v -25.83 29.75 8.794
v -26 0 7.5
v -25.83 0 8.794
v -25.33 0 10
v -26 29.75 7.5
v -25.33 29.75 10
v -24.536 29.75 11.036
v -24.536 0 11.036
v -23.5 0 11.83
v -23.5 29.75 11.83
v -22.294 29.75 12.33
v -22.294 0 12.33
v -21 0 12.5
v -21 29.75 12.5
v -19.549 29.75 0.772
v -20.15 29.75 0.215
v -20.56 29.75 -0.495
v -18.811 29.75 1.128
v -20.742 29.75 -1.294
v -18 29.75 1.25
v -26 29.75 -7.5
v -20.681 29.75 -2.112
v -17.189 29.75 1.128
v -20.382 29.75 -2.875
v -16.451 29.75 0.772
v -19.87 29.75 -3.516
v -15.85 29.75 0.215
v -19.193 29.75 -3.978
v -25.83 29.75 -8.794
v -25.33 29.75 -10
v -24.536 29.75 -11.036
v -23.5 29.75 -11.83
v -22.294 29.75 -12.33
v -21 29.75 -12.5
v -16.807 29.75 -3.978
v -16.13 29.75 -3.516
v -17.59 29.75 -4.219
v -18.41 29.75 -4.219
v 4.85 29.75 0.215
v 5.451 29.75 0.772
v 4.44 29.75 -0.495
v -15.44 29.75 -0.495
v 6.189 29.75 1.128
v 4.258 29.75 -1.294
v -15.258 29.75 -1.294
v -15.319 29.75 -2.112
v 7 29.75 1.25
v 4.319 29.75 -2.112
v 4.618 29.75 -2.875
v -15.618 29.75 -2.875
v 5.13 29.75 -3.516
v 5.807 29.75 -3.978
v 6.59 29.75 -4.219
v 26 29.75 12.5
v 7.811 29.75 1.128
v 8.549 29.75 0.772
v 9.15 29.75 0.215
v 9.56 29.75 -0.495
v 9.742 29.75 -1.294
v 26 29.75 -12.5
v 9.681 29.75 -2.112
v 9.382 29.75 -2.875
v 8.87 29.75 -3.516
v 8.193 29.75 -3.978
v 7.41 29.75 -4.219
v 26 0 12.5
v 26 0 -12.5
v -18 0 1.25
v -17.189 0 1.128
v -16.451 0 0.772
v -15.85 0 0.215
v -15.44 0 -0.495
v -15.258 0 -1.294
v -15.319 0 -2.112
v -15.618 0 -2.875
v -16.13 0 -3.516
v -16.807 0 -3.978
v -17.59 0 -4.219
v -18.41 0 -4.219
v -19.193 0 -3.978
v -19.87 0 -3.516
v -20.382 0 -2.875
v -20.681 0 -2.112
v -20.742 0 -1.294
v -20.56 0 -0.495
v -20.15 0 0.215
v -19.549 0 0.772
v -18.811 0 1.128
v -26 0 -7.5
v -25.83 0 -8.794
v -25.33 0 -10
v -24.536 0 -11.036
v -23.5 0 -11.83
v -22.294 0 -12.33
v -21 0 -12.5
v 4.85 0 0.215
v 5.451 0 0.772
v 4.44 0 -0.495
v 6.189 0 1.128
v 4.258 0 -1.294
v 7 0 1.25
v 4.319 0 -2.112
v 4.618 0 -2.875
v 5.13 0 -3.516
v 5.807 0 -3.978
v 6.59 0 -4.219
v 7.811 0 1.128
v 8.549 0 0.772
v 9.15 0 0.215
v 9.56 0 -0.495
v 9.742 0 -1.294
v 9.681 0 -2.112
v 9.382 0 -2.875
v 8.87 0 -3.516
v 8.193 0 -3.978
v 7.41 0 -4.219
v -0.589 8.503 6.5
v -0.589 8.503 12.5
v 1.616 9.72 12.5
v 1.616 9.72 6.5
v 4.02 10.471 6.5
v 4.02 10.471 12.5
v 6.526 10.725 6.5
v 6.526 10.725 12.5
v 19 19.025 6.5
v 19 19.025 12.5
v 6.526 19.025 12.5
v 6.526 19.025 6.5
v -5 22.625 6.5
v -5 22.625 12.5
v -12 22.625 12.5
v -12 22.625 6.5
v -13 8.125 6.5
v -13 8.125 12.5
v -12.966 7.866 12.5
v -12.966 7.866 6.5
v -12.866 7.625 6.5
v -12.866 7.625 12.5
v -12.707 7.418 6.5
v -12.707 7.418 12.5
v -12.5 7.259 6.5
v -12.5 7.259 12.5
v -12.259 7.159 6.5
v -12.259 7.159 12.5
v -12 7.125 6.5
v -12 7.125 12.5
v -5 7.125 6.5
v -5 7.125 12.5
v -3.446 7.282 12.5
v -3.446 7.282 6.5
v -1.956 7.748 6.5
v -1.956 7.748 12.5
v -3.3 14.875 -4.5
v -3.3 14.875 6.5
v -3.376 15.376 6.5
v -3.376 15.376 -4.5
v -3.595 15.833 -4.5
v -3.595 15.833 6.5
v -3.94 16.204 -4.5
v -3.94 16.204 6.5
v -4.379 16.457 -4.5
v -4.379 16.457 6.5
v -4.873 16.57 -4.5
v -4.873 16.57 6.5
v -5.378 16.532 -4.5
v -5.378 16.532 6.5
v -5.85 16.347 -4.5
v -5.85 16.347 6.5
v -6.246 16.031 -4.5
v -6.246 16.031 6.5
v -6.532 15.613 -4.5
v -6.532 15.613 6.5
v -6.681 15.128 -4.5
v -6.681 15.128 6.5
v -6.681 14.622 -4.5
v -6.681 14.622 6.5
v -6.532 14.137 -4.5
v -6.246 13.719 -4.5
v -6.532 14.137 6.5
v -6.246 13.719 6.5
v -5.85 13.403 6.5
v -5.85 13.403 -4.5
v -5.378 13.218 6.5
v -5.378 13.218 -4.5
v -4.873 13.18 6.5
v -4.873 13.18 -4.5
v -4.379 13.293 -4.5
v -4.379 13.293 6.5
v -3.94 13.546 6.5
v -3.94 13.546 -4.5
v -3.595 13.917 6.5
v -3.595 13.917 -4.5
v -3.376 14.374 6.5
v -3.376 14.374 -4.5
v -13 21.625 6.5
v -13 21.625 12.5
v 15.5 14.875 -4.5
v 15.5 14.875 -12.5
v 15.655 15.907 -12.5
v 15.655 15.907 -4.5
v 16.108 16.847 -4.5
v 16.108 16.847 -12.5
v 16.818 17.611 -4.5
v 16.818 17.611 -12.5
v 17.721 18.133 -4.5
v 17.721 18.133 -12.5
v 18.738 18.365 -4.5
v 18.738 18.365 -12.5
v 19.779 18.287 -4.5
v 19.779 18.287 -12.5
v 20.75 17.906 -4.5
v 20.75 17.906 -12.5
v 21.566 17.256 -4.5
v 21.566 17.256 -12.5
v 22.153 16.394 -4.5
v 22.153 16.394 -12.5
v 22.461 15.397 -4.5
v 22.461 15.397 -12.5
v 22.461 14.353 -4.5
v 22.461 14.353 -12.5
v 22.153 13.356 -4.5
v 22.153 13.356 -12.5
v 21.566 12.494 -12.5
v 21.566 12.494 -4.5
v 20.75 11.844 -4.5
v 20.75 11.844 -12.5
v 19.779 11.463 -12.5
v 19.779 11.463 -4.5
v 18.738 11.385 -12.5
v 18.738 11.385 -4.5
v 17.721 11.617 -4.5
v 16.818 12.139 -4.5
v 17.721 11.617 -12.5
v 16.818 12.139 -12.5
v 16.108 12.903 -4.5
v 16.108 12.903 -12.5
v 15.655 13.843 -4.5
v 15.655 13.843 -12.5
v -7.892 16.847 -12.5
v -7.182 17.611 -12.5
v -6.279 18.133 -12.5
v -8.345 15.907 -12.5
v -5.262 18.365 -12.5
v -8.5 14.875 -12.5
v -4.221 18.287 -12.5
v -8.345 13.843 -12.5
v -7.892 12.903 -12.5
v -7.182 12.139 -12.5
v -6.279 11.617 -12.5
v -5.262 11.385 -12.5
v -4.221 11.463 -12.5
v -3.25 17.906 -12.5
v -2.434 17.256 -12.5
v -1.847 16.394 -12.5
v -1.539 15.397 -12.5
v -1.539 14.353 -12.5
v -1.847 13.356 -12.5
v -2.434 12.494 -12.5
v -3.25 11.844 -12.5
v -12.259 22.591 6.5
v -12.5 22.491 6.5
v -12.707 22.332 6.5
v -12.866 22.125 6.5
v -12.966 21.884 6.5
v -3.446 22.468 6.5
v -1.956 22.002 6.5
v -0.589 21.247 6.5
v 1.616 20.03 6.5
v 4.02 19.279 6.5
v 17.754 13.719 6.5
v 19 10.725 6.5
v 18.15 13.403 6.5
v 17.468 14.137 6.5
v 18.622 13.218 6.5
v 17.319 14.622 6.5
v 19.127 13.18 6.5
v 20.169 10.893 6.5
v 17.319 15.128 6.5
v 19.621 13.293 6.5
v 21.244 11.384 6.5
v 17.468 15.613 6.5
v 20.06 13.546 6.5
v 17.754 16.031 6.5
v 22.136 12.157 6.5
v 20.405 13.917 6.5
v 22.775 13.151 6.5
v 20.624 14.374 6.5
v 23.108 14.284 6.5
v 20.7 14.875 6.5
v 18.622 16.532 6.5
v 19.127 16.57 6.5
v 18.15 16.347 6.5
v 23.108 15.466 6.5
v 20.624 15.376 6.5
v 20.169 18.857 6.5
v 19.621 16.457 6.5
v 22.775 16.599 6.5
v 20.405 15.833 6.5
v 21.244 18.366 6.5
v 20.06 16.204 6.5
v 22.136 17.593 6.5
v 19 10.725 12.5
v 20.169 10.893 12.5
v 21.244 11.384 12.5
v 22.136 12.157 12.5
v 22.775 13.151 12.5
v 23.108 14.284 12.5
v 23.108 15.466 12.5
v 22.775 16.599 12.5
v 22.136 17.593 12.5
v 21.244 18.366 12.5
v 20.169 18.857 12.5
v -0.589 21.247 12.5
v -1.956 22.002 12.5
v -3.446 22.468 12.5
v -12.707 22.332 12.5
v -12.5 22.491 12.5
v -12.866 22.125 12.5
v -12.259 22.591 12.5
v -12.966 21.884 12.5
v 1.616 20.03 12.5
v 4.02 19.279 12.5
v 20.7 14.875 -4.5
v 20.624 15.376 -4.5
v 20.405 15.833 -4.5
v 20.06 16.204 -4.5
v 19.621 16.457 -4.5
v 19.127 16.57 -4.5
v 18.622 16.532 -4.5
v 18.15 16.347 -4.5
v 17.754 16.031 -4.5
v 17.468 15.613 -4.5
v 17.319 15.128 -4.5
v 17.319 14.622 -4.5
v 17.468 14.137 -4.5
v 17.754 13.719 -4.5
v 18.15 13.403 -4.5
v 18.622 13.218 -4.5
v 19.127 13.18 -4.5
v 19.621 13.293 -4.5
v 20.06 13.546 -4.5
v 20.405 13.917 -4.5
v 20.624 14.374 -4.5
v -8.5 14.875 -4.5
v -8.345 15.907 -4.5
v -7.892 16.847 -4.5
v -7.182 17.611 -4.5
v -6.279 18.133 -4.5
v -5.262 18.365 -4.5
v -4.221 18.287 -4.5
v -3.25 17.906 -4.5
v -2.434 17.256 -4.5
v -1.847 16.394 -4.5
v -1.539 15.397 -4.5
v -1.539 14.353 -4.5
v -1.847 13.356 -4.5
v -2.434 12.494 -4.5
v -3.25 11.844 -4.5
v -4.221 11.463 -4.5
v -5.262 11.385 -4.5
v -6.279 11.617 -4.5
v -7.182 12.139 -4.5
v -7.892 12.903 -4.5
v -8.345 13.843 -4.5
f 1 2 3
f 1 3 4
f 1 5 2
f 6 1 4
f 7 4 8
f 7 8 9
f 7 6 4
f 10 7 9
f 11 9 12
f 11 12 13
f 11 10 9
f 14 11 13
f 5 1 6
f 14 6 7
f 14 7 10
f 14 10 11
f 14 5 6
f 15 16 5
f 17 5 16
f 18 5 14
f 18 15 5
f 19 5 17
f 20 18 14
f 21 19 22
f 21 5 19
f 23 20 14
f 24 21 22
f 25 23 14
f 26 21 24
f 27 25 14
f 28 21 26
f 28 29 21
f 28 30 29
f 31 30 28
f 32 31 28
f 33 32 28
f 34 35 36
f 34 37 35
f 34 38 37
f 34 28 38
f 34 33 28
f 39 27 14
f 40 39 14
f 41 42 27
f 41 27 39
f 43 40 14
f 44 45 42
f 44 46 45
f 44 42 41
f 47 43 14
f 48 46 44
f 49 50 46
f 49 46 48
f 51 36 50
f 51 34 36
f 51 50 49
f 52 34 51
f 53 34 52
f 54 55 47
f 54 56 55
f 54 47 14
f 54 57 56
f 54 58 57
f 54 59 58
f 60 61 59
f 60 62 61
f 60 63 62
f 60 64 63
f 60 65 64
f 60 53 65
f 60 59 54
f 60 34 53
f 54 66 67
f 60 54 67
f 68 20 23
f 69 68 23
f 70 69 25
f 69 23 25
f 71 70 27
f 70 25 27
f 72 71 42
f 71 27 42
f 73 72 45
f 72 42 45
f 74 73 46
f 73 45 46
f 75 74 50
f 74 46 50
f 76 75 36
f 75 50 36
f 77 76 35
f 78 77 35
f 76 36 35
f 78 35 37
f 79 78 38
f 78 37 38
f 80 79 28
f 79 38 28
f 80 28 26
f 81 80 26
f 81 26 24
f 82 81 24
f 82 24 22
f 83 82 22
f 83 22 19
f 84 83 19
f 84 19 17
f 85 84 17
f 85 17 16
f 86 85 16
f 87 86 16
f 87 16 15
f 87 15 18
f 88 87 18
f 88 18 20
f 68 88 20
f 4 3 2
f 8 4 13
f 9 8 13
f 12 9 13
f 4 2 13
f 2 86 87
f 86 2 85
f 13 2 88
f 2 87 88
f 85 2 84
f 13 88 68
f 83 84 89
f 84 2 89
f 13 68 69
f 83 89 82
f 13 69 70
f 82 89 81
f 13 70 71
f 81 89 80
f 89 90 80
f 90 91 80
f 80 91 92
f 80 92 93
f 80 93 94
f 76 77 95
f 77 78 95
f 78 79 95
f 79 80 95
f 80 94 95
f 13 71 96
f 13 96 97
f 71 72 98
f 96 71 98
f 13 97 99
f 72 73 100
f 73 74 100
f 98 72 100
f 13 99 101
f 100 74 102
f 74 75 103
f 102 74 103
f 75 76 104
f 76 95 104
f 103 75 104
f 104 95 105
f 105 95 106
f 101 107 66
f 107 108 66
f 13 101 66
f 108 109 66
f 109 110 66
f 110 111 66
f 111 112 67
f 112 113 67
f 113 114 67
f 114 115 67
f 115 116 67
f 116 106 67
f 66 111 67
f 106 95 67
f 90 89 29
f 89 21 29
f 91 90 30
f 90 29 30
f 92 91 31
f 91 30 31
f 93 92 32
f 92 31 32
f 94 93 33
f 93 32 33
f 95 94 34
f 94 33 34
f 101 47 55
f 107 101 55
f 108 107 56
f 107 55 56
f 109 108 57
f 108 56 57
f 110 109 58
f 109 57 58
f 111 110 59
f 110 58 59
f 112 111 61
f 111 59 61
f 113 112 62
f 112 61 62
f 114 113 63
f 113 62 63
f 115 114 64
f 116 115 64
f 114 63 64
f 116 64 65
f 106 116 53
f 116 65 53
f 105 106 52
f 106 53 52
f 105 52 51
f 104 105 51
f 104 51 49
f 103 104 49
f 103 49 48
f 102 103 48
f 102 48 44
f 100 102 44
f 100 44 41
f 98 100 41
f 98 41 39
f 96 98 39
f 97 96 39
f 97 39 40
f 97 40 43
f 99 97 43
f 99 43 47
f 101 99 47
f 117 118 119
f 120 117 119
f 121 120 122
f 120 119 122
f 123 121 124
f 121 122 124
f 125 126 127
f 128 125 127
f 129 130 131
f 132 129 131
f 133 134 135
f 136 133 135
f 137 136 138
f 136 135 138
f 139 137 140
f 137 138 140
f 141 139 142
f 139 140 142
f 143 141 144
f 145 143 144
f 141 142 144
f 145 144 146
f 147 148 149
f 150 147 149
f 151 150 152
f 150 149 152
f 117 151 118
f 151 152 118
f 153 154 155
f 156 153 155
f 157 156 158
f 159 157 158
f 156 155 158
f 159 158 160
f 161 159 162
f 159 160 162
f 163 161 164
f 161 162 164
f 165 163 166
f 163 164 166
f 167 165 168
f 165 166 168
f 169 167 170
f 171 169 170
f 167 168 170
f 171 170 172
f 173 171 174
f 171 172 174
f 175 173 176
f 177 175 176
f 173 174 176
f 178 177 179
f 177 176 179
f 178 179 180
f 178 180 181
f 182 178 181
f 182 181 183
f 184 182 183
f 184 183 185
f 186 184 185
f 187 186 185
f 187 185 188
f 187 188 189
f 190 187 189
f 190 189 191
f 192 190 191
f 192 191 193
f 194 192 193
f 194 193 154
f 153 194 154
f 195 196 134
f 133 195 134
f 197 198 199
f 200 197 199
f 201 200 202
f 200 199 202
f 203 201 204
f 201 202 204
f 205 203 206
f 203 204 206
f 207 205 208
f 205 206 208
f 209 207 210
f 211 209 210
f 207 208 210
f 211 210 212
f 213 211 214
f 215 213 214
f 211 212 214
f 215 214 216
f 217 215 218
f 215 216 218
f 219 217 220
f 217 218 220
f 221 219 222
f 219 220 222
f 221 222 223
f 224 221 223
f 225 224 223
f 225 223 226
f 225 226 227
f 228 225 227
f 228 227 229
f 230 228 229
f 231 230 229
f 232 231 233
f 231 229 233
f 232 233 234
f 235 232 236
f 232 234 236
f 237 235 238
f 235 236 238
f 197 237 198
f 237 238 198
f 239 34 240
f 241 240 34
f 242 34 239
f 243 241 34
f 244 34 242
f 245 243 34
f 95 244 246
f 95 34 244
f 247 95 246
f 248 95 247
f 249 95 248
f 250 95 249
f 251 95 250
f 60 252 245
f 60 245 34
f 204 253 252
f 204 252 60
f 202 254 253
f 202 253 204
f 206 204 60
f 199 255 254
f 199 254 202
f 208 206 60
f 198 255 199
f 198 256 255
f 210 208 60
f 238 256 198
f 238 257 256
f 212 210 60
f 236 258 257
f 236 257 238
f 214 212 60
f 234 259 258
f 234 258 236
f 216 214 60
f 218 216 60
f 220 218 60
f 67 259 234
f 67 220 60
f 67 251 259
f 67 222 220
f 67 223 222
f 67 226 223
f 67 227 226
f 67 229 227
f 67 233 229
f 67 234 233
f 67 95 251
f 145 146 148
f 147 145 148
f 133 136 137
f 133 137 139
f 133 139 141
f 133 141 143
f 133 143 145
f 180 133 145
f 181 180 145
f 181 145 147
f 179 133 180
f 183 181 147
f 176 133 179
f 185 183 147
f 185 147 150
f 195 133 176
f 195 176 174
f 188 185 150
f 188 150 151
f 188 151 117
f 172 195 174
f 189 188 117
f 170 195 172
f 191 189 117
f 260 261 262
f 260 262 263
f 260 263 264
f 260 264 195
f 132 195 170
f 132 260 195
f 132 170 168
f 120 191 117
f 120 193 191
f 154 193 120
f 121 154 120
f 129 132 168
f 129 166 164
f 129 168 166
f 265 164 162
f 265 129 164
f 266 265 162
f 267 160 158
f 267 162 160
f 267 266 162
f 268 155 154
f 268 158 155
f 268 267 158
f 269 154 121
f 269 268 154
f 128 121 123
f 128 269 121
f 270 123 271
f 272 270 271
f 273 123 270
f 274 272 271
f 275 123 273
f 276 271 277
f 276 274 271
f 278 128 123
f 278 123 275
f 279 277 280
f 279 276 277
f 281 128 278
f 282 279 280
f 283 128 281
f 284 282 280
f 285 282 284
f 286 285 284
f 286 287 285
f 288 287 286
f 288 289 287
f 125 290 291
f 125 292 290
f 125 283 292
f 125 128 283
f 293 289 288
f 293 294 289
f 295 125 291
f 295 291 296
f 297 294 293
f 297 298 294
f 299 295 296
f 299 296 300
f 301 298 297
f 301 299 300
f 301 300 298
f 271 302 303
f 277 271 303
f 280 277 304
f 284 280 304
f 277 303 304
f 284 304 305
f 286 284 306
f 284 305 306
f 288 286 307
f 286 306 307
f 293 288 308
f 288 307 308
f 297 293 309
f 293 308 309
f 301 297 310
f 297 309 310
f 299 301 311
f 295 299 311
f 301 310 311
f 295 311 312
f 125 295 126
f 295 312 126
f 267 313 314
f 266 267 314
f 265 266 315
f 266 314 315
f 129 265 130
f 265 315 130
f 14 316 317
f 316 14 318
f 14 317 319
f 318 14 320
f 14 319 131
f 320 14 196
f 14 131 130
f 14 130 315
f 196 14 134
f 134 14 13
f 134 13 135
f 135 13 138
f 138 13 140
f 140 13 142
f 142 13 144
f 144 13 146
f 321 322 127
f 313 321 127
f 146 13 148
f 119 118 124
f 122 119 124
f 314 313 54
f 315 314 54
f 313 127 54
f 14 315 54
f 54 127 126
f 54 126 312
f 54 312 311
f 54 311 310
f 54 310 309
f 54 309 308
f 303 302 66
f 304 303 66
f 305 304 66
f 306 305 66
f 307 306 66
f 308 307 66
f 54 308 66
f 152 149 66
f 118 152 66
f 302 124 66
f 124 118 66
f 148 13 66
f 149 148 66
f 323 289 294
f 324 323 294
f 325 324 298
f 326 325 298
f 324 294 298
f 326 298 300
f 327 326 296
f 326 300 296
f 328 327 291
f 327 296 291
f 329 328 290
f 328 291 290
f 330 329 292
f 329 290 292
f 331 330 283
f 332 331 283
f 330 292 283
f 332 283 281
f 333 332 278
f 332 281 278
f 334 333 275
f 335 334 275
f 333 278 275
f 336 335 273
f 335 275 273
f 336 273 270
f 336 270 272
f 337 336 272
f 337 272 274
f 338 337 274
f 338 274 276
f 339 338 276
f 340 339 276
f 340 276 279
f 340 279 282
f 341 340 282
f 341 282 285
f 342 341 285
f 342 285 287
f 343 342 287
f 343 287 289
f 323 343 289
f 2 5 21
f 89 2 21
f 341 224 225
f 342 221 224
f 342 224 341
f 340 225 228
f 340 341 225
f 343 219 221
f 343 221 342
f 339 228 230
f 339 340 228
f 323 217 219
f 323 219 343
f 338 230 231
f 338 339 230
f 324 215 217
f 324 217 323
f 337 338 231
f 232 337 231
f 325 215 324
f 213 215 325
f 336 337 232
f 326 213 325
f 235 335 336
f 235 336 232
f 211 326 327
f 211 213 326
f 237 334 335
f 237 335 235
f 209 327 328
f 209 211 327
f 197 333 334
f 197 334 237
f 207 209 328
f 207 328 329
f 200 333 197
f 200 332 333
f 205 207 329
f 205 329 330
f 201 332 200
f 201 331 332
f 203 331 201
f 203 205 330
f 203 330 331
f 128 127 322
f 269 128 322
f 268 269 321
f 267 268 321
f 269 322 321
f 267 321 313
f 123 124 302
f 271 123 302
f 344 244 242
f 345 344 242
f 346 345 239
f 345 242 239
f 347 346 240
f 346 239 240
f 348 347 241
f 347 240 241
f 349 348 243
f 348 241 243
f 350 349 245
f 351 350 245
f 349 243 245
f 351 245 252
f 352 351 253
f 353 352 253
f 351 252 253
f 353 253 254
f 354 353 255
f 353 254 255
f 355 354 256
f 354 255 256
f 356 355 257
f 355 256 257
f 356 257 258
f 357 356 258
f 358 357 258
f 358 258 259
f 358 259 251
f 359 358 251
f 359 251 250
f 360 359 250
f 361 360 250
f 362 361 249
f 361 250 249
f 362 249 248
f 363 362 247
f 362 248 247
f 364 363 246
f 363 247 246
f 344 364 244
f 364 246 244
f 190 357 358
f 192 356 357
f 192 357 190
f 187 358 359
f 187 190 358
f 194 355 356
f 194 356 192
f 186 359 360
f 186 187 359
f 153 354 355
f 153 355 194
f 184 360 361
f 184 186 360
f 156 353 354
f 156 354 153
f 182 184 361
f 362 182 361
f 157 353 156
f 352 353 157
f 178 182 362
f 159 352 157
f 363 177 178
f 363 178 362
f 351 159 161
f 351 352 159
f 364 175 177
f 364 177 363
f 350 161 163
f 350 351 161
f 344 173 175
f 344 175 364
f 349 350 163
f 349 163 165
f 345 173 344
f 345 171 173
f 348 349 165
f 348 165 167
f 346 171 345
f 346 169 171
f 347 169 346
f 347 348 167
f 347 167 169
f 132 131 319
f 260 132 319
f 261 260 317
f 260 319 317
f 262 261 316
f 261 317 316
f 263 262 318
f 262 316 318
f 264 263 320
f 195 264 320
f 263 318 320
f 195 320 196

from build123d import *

# Parameters (mm, degrees)
SKETCH1_W           = 52
SKETCH1_H           = 25
BOSS_EXTRUDE1_DEPTH = 29.75
CUT_EXTRUDE1_DEPTH  = 6
CUT_EXTRUDE2_REACH  = 43.44
SKETCH4_R           = 2.75
CUT_EXTRUDE3_REACH  = 45.841
SKETCH5_R           = 1.7
FILLET1_R           = 5
SKETCH6_R           = 3.5
CUT_EXTRUDE4_DEPTH  = 8


with BuildPart() as part:
    # Sketch1 → Boss-Extrude1 (new body)
    with BuildSketch(Plane(origin=(0, 0, 0), x_dir=(1, 0, 0), z_dir=(0, 1, 0))):
        Rectangle(SKETCH1_W, SKETCH1_H)
    extrude(amount=BOSS_EXTRUDE1_DEPTH)

    # Sketch2 → Cut-Extrude1 (cut)
    with BuildSketch(Plane.XY.offset(12.5)):
        with BuildLine():
            Line((19, 19.025), (6.525623627, 19.025))
            ThreePointArc((6.525623627, 19.025), (2.798843665, 19.593482447), (-0.588958859, 21.247222222))
            ThreePointArc((-0.588958859, 21.247222222), (-2.689396423, 22.272540883), (-5, 22.625))
            Line((-5, 22.625), (-12, 22.625))
            ThreePointArc((-12, 22.625), (-12.707106781, 22.332106781), (-13, 21.625))
            Line((-13, 21.625), (-13, 8.125))
            ThreePointArc((-13, 8.125), (-12.707106781, 7.417893219), (-12, 7.125))
            Line((-12, 7.125), (-5, 7.125))
            ThreePointArc((-5, 7.125), (-2.689396423, 7.477459117), (-0.588958859, 8.502777778))
            ThreePointArc((-0.588958859, 8.502777778), (2.798843665, 10.156517553), (6.525623627, 10.725))
            Line((6.525623627, 10.725), (19, 10.725))
            ThreePointArc((19, 10.725), (23.15, 14.875), (19, 19.025))
        make_face()
    extrude(amount=-CUT_EXTRUDE1_DEPTH, mode=Mode.SUBTRACT)

    # Sketch4 → Cut-Extrude2 (cut, up to next)
    with BuildSketch(Plane(origin=(0, 29.75, 0), x_dir=(1, 0, 0), z_dir=(0, 1, 0)), mode=Mode.PRIVATE) as cut_extrude2_sk1:
        with Locations(Location((-18, 1.5, 0), (0, 0, 270))):
            Circle(SKETCH4_R)
    cut_extrude2_tool1 = extrude(cut_extrude2_sk1.sketch, amount=-CUT_EXTRUDE2_REACH, mode=Mode.PRIVATE) & part.part
    # Sketch4 → Cut-Extrude2 (cut, up to next)
    with BuildSketch(Plane(origin=(0, 29.75, 0), x_dir=(1, 0, 0), z_dir=(0, 1, 0)), mode=Mode.PRIVATE) as cut_extrude2_sk2:
        with Locations(Location((7, 1.5, 0), (0, 0, 270))):
            Circle(SKETCH4_R)
    cut_extrude2_tool2 = extrude(cut_extrude2_sk2.sketch, amount=-CUT_EXTRUDE2_REACH, mode=Mode.PRIVATE) & part.part
    add(cut_extrude2_tool1.solids().sort_by_distance((-18, 29.75, -1.5))[0], mode=Mode.SUBTRACT)
    add(cut_extrude2_tool2.solids().sort_by_distance((7, 29.75, -1.5))[0], mode=Mode.SUBTRACT)

    # Sketch5 → Cut-Extrude3 (cut, up to next)
    with BuildSketch(Plane.XY.offset(6.5), mode=Mode.PRIVATE) as cut_extrude3_sk1:
        with Locations((-5, 14.875)):
            Circle(SKETCH5_R)
    cut_extrude3_tool1 = extrude(cut_extrude3_sk1.sketch, amount=-CUT_EXTRUDE3_REACH, mode=Mode.PRIVATE) & part.part
    # Sketch5 → Cut-Extrude3 (cut, up to next)
    with BuildSketch(Plane.XY.offset(6.5), mode=Mode.PRIVATE) as cut_extrude3_sk2:
        with Locations((19, 14.875)):
            Circle(SKETCH5_R)
    cut_extrude3_tool2 = extrude(cut_extrude3_sk2.sketch, amount=-CUT_EXTRUDE3_REACH, mode=Mode.PRIVATE) & part.part
    add(cut_extrude3_tool1.solids().sort_by_distance((-5, 14.875, 6.5))[0], mode=Mode.SUBTRACT)
    add(cut_extrude3_tool2.solids().sort_by_distance((19, 14.875, 6.5))[0], mode=Mode.SUBTRACT)

    # Fillet1
    fillet1_edges = [part.edges().sort_by_distance(p)[0] for p in [
        (-26, 14.875, 12.5),
        (-26, 14.875, -12.5),
    ]]
    fillet(fillet1_edges, radius=FILLET1_R)

    # Sketch6 → Cut-Extrude4 (cut)
    with BuildSketch(Plane(origin=(0, 0, -12.5), x_dir=(-1, 0, 0), z_dir=(0, 0, -1))):
        with Locations((-19, 14.875)):
            Circle(SKETCH6_R)
        with Locations((5, 14.875)):
            Circle(SKETCH6_R)
    extrude(amount=-CUT_EXTRUDE4_DEPTH, mode=Mode.SUBTRACT)


solid = part.part
